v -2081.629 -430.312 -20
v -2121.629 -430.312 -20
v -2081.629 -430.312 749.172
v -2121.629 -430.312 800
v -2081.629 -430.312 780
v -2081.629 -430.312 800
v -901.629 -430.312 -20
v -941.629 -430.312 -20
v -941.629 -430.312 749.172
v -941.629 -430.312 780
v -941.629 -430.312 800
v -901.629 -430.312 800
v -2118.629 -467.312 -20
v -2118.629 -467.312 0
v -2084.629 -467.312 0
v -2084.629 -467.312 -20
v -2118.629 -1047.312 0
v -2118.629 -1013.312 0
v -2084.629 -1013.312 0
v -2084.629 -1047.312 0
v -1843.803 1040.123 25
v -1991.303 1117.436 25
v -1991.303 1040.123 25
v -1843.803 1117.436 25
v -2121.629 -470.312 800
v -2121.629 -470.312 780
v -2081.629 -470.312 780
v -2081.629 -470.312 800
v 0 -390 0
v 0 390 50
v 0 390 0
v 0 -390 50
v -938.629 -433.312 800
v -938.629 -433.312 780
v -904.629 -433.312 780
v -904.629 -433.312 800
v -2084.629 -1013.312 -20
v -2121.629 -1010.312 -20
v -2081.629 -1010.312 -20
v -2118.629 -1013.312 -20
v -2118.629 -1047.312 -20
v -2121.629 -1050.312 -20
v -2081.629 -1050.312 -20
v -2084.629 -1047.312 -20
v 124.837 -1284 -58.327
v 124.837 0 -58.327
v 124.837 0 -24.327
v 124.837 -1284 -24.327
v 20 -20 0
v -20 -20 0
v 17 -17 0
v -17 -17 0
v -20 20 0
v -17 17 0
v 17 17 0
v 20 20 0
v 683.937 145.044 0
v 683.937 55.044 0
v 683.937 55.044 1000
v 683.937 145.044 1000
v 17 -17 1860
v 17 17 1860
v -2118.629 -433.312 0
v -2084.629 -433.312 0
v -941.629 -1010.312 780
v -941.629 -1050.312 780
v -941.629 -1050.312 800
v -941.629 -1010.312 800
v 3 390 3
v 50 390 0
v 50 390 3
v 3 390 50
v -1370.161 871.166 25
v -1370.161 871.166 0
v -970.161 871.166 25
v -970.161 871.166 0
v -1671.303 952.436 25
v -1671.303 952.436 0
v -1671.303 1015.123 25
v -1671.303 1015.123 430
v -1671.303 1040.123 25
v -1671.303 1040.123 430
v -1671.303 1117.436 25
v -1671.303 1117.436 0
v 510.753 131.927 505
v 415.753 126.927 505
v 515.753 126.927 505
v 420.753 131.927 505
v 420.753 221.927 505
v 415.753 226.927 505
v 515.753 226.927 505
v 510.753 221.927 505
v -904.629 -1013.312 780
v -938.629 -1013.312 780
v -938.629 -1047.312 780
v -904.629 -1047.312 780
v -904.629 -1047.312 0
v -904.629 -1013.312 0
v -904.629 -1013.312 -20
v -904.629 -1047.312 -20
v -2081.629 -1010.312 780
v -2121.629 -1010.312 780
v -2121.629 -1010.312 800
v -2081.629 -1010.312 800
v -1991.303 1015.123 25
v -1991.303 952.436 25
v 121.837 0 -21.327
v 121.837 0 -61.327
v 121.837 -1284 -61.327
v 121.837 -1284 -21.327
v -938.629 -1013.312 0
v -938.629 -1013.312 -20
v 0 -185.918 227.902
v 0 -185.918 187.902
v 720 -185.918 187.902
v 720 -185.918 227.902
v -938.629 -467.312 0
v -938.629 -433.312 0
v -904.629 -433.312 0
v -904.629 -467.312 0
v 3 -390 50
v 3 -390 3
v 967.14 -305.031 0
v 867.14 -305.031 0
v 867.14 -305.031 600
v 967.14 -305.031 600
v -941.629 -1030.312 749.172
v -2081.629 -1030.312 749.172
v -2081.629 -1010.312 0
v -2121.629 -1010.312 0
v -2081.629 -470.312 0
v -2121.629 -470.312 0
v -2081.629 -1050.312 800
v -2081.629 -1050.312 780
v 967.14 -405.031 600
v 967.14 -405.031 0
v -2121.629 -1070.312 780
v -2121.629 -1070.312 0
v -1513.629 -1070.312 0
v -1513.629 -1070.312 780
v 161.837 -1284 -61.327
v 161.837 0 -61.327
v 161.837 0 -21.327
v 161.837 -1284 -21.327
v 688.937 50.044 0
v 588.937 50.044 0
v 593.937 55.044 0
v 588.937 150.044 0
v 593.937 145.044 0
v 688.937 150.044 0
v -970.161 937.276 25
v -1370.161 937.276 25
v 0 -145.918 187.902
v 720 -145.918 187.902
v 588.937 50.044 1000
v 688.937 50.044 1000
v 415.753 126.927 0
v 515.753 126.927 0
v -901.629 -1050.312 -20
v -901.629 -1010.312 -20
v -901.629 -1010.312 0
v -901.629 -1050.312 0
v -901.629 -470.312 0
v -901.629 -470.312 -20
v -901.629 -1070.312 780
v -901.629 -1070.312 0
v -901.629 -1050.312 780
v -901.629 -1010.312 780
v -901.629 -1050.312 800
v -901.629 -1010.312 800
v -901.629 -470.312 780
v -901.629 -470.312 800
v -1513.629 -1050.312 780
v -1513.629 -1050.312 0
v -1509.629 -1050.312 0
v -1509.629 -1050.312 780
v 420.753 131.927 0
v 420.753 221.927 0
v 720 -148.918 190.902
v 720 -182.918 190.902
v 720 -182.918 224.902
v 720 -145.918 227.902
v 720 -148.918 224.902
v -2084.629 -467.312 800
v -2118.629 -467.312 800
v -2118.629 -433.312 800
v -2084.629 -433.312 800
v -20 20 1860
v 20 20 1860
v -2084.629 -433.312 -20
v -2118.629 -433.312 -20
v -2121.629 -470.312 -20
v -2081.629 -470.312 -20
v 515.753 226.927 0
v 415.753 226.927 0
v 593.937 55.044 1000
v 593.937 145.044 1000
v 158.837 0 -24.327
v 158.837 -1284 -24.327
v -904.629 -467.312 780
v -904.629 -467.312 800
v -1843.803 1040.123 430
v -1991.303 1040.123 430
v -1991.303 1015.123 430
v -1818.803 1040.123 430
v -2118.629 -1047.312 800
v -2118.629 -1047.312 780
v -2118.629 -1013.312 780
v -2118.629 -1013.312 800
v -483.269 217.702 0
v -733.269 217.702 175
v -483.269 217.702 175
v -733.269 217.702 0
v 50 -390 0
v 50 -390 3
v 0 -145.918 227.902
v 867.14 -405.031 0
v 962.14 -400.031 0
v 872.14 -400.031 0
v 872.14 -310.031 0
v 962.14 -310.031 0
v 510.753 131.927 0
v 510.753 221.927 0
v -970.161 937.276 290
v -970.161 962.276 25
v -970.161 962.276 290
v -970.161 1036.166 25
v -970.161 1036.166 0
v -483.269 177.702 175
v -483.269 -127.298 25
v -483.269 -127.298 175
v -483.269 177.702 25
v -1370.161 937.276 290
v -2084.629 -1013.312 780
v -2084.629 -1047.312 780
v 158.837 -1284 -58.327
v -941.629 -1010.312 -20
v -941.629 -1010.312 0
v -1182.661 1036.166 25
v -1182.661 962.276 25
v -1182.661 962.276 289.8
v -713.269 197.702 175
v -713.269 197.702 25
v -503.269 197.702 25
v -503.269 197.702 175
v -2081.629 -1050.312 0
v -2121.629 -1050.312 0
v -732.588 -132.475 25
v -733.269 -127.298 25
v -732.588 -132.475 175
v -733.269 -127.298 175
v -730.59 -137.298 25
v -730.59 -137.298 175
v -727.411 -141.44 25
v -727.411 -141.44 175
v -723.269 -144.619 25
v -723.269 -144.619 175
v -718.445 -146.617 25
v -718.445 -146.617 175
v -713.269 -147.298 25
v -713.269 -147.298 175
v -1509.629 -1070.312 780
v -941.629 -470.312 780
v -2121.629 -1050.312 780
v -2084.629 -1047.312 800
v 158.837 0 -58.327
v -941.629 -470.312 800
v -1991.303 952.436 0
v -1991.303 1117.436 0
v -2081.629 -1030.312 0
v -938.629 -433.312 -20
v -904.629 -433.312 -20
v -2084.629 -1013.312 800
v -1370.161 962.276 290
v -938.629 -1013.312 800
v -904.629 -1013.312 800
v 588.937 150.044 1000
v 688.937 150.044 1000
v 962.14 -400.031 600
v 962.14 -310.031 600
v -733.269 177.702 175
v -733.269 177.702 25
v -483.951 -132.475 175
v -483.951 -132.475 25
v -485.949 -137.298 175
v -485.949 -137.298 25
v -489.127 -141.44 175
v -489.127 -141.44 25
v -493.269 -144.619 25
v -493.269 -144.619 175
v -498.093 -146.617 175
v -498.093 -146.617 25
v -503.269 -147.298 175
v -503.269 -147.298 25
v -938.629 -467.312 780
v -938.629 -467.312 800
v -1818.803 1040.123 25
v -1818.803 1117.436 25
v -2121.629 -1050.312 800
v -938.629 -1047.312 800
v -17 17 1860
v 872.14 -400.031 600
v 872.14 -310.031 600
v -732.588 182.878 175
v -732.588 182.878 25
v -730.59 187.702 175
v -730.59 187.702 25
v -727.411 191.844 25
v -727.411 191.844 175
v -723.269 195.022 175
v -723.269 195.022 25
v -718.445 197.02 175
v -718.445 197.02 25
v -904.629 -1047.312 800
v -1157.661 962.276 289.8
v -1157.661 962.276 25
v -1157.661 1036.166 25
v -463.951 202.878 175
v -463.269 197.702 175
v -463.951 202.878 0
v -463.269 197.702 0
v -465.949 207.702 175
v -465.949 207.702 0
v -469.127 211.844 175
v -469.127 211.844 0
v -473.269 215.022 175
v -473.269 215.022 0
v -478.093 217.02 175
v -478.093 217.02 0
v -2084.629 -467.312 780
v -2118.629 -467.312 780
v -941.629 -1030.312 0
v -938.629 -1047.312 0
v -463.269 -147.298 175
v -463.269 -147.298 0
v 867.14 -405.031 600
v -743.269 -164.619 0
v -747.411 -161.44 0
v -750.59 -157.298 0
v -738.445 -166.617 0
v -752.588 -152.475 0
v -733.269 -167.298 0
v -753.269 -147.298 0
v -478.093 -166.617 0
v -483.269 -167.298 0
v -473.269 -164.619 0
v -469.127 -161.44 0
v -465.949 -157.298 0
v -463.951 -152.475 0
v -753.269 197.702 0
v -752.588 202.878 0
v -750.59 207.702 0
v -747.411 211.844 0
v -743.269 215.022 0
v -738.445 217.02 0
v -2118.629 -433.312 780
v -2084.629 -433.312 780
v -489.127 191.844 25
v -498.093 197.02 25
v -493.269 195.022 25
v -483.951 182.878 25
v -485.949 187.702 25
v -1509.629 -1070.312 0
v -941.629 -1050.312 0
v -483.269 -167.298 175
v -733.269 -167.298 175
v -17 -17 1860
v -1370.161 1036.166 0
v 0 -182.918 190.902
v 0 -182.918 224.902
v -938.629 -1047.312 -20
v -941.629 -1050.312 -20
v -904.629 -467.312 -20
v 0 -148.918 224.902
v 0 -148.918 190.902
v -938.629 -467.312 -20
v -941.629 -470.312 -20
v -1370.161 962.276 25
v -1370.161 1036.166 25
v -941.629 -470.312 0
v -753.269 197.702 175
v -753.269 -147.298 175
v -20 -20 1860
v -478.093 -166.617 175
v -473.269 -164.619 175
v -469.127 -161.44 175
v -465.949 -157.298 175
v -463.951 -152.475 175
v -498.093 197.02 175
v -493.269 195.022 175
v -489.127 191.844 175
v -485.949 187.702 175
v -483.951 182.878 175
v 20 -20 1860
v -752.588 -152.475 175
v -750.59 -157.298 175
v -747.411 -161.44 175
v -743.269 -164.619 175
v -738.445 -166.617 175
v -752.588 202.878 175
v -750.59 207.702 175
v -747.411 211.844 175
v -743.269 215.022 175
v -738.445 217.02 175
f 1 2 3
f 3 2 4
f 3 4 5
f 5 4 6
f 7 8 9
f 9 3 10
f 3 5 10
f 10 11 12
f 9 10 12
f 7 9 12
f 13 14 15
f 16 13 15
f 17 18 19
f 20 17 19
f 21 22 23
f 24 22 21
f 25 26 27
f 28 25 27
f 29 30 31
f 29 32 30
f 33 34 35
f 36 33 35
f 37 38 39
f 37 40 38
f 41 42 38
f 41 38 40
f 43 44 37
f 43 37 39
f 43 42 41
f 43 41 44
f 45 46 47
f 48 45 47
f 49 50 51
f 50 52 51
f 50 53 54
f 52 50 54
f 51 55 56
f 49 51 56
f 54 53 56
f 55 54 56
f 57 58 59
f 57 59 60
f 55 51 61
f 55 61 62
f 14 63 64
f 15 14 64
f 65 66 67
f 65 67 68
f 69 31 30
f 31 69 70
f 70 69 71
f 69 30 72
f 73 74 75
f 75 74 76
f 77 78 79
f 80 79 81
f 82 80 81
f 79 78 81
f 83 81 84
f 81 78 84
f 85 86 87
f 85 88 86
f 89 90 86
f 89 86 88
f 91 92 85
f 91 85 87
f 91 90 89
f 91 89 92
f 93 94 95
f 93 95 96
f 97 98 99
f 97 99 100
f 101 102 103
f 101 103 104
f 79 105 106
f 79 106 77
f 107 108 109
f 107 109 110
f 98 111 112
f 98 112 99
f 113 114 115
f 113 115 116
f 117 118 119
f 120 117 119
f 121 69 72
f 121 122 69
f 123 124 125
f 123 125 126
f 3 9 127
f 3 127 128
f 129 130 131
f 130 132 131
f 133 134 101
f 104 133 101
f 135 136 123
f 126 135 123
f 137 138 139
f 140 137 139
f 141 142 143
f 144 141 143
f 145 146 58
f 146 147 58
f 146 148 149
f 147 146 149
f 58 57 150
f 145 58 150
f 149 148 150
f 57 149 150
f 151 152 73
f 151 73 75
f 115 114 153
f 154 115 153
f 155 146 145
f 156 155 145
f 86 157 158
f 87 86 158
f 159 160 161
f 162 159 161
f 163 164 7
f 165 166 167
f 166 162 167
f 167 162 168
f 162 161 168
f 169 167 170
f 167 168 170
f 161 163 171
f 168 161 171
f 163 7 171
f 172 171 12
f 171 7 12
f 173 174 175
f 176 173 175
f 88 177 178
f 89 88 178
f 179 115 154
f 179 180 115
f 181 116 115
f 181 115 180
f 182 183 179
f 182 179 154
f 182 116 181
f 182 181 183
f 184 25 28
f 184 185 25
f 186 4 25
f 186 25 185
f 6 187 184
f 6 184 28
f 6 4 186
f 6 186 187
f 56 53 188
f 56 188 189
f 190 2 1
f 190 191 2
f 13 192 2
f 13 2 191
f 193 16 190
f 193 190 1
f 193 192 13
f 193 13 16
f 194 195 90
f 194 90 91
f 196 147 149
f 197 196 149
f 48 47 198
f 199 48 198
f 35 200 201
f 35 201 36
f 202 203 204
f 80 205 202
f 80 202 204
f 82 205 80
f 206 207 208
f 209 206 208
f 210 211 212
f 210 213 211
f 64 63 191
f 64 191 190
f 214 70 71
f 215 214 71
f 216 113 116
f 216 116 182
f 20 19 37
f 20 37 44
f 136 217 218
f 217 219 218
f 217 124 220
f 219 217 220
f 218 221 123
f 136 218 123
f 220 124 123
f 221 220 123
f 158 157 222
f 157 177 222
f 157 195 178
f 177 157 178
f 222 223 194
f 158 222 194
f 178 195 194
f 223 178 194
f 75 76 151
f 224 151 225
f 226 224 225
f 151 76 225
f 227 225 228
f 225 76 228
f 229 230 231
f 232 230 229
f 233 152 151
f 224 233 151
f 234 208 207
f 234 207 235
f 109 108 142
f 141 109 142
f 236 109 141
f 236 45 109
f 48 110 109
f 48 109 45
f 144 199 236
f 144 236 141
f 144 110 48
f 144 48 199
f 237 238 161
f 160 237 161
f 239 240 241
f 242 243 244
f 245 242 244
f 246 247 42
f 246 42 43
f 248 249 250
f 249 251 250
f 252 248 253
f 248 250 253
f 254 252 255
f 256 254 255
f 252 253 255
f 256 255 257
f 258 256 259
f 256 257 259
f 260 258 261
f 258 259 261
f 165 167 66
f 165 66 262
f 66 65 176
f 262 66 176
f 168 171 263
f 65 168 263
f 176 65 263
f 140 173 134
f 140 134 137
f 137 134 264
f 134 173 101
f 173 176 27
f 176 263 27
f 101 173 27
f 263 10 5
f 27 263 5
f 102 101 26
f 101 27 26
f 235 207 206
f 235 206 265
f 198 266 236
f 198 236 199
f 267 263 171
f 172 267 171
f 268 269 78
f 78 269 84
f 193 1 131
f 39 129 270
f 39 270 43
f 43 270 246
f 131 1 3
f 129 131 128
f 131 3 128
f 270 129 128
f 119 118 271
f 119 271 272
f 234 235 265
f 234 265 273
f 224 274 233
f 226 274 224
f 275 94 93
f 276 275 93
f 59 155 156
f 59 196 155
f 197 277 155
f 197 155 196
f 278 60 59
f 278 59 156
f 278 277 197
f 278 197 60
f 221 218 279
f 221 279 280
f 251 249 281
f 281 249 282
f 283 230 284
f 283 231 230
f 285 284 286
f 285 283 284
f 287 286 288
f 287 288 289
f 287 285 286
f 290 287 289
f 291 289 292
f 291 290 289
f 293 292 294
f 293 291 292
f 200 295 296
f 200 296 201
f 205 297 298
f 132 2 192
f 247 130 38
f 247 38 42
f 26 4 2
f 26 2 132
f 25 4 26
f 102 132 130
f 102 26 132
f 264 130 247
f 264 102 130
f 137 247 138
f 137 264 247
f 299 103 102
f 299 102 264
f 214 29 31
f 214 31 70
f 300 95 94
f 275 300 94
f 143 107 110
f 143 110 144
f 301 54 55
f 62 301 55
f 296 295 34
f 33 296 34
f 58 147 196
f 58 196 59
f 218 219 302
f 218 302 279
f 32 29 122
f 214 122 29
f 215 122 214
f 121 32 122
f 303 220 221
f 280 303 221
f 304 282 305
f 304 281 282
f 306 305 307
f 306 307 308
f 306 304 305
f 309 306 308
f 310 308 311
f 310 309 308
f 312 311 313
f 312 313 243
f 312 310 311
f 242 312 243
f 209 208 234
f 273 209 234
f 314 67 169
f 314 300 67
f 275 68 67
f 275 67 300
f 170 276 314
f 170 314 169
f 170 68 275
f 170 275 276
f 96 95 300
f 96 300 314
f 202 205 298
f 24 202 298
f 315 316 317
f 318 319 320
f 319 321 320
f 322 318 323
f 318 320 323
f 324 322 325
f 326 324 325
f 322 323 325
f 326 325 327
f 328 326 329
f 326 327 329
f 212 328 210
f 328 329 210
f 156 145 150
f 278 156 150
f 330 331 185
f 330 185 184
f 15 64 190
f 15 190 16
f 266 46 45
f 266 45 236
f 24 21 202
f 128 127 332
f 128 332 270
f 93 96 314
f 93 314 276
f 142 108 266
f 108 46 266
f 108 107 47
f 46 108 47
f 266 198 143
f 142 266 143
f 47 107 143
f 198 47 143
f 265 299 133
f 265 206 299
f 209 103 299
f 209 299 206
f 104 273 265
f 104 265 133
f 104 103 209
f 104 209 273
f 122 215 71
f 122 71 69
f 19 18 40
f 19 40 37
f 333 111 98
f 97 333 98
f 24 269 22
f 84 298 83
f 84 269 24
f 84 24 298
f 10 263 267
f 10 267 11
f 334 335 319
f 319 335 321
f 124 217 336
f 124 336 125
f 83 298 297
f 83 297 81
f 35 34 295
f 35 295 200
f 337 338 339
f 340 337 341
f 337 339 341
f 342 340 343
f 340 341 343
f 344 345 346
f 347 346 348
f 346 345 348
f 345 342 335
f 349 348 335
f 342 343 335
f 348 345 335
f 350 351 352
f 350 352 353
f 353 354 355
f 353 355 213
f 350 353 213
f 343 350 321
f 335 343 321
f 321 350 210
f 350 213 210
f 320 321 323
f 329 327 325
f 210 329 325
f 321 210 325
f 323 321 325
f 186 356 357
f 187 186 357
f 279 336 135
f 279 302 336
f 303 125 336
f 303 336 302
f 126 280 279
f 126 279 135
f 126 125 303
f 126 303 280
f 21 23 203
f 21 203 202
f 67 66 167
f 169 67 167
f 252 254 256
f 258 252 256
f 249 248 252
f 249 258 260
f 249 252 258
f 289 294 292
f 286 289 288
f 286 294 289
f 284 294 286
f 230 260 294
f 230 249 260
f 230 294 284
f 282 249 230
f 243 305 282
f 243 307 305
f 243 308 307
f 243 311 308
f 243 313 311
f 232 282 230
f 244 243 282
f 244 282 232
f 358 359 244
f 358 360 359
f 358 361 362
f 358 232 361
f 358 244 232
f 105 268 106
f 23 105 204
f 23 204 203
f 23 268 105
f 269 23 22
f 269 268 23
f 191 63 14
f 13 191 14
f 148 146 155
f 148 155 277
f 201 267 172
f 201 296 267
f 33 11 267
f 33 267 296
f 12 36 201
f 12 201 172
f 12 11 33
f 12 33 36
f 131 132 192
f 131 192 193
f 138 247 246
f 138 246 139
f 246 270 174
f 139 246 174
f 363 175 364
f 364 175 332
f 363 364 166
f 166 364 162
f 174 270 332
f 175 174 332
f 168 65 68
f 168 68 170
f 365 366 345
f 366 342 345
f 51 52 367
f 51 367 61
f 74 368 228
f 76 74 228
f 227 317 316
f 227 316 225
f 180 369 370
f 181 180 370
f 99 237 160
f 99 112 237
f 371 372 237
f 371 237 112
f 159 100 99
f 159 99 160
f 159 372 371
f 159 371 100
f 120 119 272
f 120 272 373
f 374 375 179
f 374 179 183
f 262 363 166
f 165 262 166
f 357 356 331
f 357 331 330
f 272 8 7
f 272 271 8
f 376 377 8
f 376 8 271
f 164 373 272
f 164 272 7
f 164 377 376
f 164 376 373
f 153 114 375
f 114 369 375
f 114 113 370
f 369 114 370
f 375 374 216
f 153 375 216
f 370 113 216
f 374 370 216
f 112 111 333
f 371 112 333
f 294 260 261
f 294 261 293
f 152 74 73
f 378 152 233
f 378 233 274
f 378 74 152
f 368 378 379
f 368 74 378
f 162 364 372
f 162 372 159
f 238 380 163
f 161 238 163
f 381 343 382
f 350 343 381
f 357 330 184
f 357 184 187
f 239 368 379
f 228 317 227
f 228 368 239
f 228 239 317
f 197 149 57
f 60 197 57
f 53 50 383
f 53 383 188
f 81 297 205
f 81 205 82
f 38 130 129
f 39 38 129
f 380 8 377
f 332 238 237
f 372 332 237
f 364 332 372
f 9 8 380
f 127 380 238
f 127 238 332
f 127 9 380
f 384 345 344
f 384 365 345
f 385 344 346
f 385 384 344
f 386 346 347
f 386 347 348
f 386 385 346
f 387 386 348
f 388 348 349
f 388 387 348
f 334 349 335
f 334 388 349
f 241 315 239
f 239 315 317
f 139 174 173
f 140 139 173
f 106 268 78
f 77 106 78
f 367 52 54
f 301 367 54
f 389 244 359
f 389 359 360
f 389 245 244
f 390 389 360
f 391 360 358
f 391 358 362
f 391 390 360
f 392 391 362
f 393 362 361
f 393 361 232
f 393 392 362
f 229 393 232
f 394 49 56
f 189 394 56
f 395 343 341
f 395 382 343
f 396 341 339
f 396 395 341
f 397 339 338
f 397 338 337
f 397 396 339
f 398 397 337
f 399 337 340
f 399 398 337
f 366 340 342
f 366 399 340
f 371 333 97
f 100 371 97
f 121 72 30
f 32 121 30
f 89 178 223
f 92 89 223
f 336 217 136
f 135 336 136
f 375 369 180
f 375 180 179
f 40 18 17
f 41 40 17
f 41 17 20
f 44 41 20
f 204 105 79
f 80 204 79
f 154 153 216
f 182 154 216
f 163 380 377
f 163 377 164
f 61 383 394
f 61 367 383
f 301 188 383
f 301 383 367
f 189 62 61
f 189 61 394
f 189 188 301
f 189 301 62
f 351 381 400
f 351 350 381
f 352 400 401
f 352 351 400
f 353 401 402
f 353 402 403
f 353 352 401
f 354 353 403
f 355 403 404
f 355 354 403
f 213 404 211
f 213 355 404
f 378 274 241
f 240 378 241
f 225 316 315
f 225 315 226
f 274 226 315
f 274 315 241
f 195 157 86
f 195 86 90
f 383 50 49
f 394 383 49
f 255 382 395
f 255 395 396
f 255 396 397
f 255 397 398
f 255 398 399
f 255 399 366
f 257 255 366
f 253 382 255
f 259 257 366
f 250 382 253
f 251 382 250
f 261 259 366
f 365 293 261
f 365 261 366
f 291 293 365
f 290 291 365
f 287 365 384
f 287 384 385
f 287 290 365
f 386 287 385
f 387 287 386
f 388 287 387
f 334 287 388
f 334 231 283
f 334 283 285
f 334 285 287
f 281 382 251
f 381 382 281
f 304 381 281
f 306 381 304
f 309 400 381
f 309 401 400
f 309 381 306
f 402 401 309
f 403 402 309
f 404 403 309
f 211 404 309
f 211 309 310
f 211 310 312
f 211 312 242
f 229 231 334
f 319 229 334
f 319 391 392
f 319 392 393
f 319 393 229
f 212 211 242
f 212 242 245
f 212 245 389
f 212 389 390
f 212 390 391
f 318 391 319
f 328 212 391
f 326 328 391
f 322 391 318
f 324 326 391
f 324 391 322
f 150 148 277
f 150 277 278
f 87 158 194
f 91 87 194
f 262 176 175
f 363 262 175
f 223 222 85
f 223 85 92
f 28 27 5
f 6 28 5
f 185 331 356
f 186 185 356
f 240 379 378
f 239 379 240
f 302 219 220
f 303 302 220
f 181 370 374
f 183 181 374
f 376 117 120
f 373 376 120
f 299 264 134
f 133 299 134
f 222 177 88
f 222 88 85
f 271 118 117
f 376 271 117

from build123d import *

# Parameters (mm, degrees)
F1_DEPTH  = 390
F2_W      = 40
F2_H      = 40
F2_W_2    = 34
F2_H_2    = 34
F3_DEPTH  = 1860
F4_W      = 40
F4_H      = 40
F4_W_2    = 34
F4_H_2    = 34
F5_DEPTH  = 720
F6_W      = 40
F6_H      = 40
F6_W_2    = 34
F6_H_2    = 34
F7_DEPTH  = 1284
F8_W      = 290
F8_H      = 385
F9_DEPTH  = 25
F10_W     = 290
F10_H     = 385
F10_W_2   = 250
F10_H_2   = 345
F11_DEPTH = 150
F12_R     = 20
F13_W     = 100
F13_H     = 100
F13_W_2   = 90.0000095367
F13_H_2   = 90.0000095367
F14_DEPTH = 505
F15_W     = 100
F15_H     = 100
F15_W_2   = 90
F15_H_2   = 90
F16_DEPTH = 600
F17_W     = 100
F17_H     = 100
F17_W_2   = 90
F17_H_2   = 90
F18_DEPTH = 1000
F19_W     = 1220
F19_H     = 620
F20_DEPTH = 780
F21_W     = 40
F21_H     = 40
F21_W_2   = 34
F21_H_2   = 34
F22_DEPTH = 20
F24_DEPTH = 20
F25_W     = 40
F25_H     = 40
F25_W_2   = 34
F25_H_2   = 34
F26_DEPTH = 20
F27_W     = 320
F27_H     = 165
F28_DEPTH = 25
F29_W     = 320
F29_H     = 25
F30_DEPTH = 405
F31_W     = 25
F31_H     = 77.3133778572
F32_DEPTH = 405
F34_DEPTH = 25
F35_W     = 400
F35_H     = 165
F36_DEPTH = 25
F37_W     = 400
F37_H     = 25
F38_DEPTH = 265
F39_W     = 25
F39_H     = 73.8899850845
F40_DEPTH = 264.8
F42_DEPTH = 25
F43_W     = 1140
F43_H     = 749.1722106934
F44_DEPTH = 600


with BuildPart() as f1:
    # F0 (on Front) → F1 (new body, symmetric)
    with BuildSketch(Plane.XZ):
        Polygon((0, 50), (0, 0), (50, 0), (50, 3), (3, 3), (3, 50), align=None)
    extrude(amount=F1_DEPTH, both=True)


with BuildPart() as f3:
    # F2 (on Top) → F3 (new body)
    with BuildSketch(Plane.XY):
        Rectangle(F2_W, F2_H)
        Rectangle(F2_W_2, F2_H_2, mode=Mode.SUBTRACT)
    extrude(amount=F3_DEPTH)


with BuildPart() as f5:
    # F4 (on Right) → F5 (new body)
    with BuildSketch(Plane.YZ):
        with Locations((-165.917519927, 207.9017800093)):
            Rectangle(F4_W, F4_H)
        with Locations((-165.917519927, 207.9017800093)):
            Rectangle(F4_W_2, F4_H_2, mode=Mode.SUBTRACT)
    extrude(amount=F5_DEPTH)


with BuildPart() as f7:
    # F6 (on Front) → F7 (new body)
    with BuildSketch(Plane.XZ):
        with Locations((141.8365803361, -41.3270699978)):
            Rectangle(F6_W, F6_H)
        with Locations((141.8365803361, -41.3270699978)):
            Rectangle(F6_W_2, F6_H_2, mode=Mode.SUBTRACT)
    extrude(amount=F7_DEPTH)


with BuildPart() as f9:
    # F8 (on Top) → F9 (new body)
    with BuildSketch(Plane.XY):
        with Locations((-608.2690548897, 25.2017277479)):
            Rectangle(F8_W, F8_H)
    extrude(amount=F9_DEPTH)

    # F10 (on face) → F11 (join)
    with BuildSketch(Plane.XY.offset(25)):
        with Locations((-608.2690548897, 25.2017277479)):
            Rectangle(F10_W, F10_H)
        with Locations((-608.2690548897, 25.2017277479)):
            Rectangle(F10_W_2, F10_H_2, mode=Mode.SUBTRACT)
    extrude(amount=F11_DEPTH)

    # F12
    f12_edges = [f9.edges().sort_by_distance(p)[0] for p in [
        (-463.269055, -167.298272, 87.5),
        (-463.269055, 217.701728, 87.5),
        (-753.269055, -167.298272, 87.5),
        (-753.269055, 217.701728, 87.5),
        (-733.269055, 197.701728, 100),
        (-483.269055, 197.701728, 100),
        (-483.269055, -147.298272, 100),
        (-733.269055, -147.298272, 100),
    ]]
    fillet(f12_edges, radius=F12_R)


with BuildPart() as f14:
    # F13 (on Top) → F14 (new body)
    with BuildSketch(Plane.XY):
        with Locations((465.7528162003, 176.9267350435)):
            Rectangle(F13_W, F13_H)
        with Locations((465.7528162003, 176.9267350435)):
            Rectangle(F13_W_2, F13_H_2, mode=Mode.SUBTRACT)
    extrude(amount=F14_DEPTH)


with BuildPart() as f16:
    # F15 (on Top) → F16 (new body)
    with BuildSketch(Plane.XY):
        with Locations((917.1401381493, -355.0306677818)):
            Rectangle(F15_W, F15_H)
        with Locations((917.1401381493, -355.0306677818)):
            Rectangle(F15_W_2, F15_H_2, mode=Mode.SUBTRACT)
    extrude(amount=F16_DEPTH)


with BuildPart() as f18:
    # F17 (on Top) → F18 (new body)
    with BuildSketch(Plane.XY):
        with Locations((638.9368057251, 100.0435903668)):
            Rectangle(F17_W, F17_H)
        with Locations((638.9368057251, 100.0435903668)):
            Rectangle(F17_W_2, F17_H_2, mode=Mode.SUBTRACT)
    extrude(amount=F18_DEPTH)


with BuildPart() as f20:
    # F19 (on Top) → F20 (new body)
    with BuildSketch(Plane.XY):
        with Locations((-1511.6287612915, -740.3115653992)):
            Rectangle(F19_W, F19_H)
    extrude(amount=F20_DEPTH)

    # F21 (on face) → F22 (join)
    with BuildSketch(Plane.XY.offset(780)):
        with Locations((-2101.6287612915, -450.3115653992)):
            Rectangle(F21_W, F21_H)
        with Locations((-2101.6287612915, -450.3115653992)):
            Rectangle(F21_W_2, F21_H_2, mode=Mode.SUBTRACT)
        with Locations((-921.6287612915, -450.3115653992)):
            Rectangle(F21_W, F21_H)
        with Locations((-921.6287612915, -450.3115653992)):
            Rectangle(F21_W_2, F21_H_2, mode=Mode.SUBTRACT)
        with Locations((-921.6287612915, -1030.3115653992)):
            Rectangle(F21_W, F21_H)
        with Locations((-921.6287612915, -1030.3115653992)):
            Rectangle(F21_W_2, F21_H_2, mode=Mode.SUBTRACT)
        with Locations((-2101.6287612915, -1030.3115653992)):
            Rectangle(F21_W, F21_H)
        with Locations((-2101.6287612915, -1030.3115653992)):
            Rectangle(F21_W_2, F21_H_2, mode=Mode.SUBTRACT)
    extrude(amount=F22_DEPTH)

    # F23 (on face) → F24 (join)
    with BuildSketch(Plane.XZ.offset(1050.3115653992)):
        Polygon((-941.6287612915, 780), (-1509.6287612915, 780), (-1509.6287612915, 0), (-901.6287612915, 0), (-901.6287612915, 780), align=None)
        Polygon((-1513.6287612915, 0), (-1513.6287612915, 780), (-2081.6287612915, 780), (-2121.6287612915, 780), (-2121.6287612915, 0), align=None)
    extrude(amount=F24_DEPTH)

    # F25 (on face) → F26 (join)
    with BuildSketch(Plane(origin=(0, 0, 0), x_dir=(1, 0, 0), z_dir=(0, 0, -1))):
        with Locations((-921.6287612915, 1030.3115653992)):
            Rectangle(F25_W, F25_H)
        with Locations((-921.6287612915, 1030.3115653992)):
            Rectangle(F25_W_2, F25_H_2, mode=Mode.SUBTRACT)
        with Locations((-2101.6287612915, 1030.3115653992)):
            Rectangle(F25_W, F25_H)
        with Locations((-2101.6287612915, 1030.3115653992)):
            Rectangle(F25_W_2, F25_H_2, mode=Mode.SUBTRACT)
        with Locations((-2101.6287612915, 450.3115653992)):
            Rectangle(F25_W, F25_H)
        with Locations((-2101.6287612915, 450.3115653992)):
            Rectangle(F25_W_2, F25_H_2, mode=Mode.SUBTRACT)
        with Locations((-921.6287612915, 450.3115653992)):
            Rectangle(F25_W, F25_H)
        with Locations((-921.6287612915, 450.3115653992)):
            Rectangle(F25_W_2, F25_H_2, mode=Mode.SUBTRACT)
    extrude(amount=F26_DEPTH)

    # F43 (on face) → F44 (cut)
    with BuildSketch(Plane(origin=(0, -430.3115653992, 0), x_dir=(-1, 0, 0), z_dir=(0, 1, 0))):
        with Locations((1511.6287612915, 374.5861053467)):
            Rectangle(F43_W, F43_H)
    extrude(amount=-F44_DEPTH, mode=Mode.SUBTRACT)


with BuildPart() as f28:
    # F27 (on Top) → F28 (new body)
    with BuildSketch(Plane.XY):
        with Locations((-1831.3033914566, 1034.9359107018)):
            Rectangle(F27_W, F27_H)
    extrude(amount=F28_DEPTH)

    # F29 (on face) → F30 (join)
    with BuildSketch(Plane.XY.offset(25)):
        with Locations((-1831.3033914566, 1027.6225328445)):
            Rectangle(F29_W, F29_H)
    extrude(amount=F30_DEPTH)

    # F31 (on face) → F32 (join)
    with BuildSketch(Plane.XY.offset(25)):
        with Locations((-1831.3033914566, 1078.7792217731)):
            Rectangle(F31_W, F31_H)
    extrude(amount=F32_DEPTH)

    # F33 (on face) → F34 (cut)
    with BuildSketch(Plane.YZ.offset(-1818.8033914566)):
        Polygon((1117.4359107018, 430), (1040.1225328445, 430), (1117.4359107018, 25), align=None)
    extrude(amount=-F34_DEPTH, mode=Mode.SUBTRACT)


with BuildPart() as f36:
    # F35 (on Top) → F36 (new body)
    with BuildSketch(Plane.XY):
        with Locations((-1170.1606631279, 953.6658716202)):
            Rectangle(F35_W, F35_H)
    extrude(amount=F36_DEPTH)

    # F37 (on face) → F38 (join)
    with BuildSketch(Plane.XY.offset(25)):
        with Locations((-1170.1606631279, 949.7758865356)):
            Rectangle(F37_W, F37_H)
    extrude(amount=F38_DEPTH)

    # F39 (on face) → F40 (join)
    with BuildSketch(Plane.XY.offset(25)):
        with Locations((-1170.1606631279, 999.2208790779)):
            Rectangle(F39_W, F39_H)
    extrude(amount=F40_DEPTH)

    # F41 (on face) → F42 (cut)
    with BuildSketch(Plane.YZ.offset(-1157.6606631279)):
        Polygon((1036.1658716202, 289.8), (962.2758865356, 289.8), (1036.1658716202, 25), align=None)
    extrude(amount=-F42_DEPTH, mode=Mode.SUBTRACT)


solid = Compound([f1.part, f3.part, f5.part, f7.part, f9.part, f14.part, f16.part, f18.part, f20.part, f28.part, f36.part])
